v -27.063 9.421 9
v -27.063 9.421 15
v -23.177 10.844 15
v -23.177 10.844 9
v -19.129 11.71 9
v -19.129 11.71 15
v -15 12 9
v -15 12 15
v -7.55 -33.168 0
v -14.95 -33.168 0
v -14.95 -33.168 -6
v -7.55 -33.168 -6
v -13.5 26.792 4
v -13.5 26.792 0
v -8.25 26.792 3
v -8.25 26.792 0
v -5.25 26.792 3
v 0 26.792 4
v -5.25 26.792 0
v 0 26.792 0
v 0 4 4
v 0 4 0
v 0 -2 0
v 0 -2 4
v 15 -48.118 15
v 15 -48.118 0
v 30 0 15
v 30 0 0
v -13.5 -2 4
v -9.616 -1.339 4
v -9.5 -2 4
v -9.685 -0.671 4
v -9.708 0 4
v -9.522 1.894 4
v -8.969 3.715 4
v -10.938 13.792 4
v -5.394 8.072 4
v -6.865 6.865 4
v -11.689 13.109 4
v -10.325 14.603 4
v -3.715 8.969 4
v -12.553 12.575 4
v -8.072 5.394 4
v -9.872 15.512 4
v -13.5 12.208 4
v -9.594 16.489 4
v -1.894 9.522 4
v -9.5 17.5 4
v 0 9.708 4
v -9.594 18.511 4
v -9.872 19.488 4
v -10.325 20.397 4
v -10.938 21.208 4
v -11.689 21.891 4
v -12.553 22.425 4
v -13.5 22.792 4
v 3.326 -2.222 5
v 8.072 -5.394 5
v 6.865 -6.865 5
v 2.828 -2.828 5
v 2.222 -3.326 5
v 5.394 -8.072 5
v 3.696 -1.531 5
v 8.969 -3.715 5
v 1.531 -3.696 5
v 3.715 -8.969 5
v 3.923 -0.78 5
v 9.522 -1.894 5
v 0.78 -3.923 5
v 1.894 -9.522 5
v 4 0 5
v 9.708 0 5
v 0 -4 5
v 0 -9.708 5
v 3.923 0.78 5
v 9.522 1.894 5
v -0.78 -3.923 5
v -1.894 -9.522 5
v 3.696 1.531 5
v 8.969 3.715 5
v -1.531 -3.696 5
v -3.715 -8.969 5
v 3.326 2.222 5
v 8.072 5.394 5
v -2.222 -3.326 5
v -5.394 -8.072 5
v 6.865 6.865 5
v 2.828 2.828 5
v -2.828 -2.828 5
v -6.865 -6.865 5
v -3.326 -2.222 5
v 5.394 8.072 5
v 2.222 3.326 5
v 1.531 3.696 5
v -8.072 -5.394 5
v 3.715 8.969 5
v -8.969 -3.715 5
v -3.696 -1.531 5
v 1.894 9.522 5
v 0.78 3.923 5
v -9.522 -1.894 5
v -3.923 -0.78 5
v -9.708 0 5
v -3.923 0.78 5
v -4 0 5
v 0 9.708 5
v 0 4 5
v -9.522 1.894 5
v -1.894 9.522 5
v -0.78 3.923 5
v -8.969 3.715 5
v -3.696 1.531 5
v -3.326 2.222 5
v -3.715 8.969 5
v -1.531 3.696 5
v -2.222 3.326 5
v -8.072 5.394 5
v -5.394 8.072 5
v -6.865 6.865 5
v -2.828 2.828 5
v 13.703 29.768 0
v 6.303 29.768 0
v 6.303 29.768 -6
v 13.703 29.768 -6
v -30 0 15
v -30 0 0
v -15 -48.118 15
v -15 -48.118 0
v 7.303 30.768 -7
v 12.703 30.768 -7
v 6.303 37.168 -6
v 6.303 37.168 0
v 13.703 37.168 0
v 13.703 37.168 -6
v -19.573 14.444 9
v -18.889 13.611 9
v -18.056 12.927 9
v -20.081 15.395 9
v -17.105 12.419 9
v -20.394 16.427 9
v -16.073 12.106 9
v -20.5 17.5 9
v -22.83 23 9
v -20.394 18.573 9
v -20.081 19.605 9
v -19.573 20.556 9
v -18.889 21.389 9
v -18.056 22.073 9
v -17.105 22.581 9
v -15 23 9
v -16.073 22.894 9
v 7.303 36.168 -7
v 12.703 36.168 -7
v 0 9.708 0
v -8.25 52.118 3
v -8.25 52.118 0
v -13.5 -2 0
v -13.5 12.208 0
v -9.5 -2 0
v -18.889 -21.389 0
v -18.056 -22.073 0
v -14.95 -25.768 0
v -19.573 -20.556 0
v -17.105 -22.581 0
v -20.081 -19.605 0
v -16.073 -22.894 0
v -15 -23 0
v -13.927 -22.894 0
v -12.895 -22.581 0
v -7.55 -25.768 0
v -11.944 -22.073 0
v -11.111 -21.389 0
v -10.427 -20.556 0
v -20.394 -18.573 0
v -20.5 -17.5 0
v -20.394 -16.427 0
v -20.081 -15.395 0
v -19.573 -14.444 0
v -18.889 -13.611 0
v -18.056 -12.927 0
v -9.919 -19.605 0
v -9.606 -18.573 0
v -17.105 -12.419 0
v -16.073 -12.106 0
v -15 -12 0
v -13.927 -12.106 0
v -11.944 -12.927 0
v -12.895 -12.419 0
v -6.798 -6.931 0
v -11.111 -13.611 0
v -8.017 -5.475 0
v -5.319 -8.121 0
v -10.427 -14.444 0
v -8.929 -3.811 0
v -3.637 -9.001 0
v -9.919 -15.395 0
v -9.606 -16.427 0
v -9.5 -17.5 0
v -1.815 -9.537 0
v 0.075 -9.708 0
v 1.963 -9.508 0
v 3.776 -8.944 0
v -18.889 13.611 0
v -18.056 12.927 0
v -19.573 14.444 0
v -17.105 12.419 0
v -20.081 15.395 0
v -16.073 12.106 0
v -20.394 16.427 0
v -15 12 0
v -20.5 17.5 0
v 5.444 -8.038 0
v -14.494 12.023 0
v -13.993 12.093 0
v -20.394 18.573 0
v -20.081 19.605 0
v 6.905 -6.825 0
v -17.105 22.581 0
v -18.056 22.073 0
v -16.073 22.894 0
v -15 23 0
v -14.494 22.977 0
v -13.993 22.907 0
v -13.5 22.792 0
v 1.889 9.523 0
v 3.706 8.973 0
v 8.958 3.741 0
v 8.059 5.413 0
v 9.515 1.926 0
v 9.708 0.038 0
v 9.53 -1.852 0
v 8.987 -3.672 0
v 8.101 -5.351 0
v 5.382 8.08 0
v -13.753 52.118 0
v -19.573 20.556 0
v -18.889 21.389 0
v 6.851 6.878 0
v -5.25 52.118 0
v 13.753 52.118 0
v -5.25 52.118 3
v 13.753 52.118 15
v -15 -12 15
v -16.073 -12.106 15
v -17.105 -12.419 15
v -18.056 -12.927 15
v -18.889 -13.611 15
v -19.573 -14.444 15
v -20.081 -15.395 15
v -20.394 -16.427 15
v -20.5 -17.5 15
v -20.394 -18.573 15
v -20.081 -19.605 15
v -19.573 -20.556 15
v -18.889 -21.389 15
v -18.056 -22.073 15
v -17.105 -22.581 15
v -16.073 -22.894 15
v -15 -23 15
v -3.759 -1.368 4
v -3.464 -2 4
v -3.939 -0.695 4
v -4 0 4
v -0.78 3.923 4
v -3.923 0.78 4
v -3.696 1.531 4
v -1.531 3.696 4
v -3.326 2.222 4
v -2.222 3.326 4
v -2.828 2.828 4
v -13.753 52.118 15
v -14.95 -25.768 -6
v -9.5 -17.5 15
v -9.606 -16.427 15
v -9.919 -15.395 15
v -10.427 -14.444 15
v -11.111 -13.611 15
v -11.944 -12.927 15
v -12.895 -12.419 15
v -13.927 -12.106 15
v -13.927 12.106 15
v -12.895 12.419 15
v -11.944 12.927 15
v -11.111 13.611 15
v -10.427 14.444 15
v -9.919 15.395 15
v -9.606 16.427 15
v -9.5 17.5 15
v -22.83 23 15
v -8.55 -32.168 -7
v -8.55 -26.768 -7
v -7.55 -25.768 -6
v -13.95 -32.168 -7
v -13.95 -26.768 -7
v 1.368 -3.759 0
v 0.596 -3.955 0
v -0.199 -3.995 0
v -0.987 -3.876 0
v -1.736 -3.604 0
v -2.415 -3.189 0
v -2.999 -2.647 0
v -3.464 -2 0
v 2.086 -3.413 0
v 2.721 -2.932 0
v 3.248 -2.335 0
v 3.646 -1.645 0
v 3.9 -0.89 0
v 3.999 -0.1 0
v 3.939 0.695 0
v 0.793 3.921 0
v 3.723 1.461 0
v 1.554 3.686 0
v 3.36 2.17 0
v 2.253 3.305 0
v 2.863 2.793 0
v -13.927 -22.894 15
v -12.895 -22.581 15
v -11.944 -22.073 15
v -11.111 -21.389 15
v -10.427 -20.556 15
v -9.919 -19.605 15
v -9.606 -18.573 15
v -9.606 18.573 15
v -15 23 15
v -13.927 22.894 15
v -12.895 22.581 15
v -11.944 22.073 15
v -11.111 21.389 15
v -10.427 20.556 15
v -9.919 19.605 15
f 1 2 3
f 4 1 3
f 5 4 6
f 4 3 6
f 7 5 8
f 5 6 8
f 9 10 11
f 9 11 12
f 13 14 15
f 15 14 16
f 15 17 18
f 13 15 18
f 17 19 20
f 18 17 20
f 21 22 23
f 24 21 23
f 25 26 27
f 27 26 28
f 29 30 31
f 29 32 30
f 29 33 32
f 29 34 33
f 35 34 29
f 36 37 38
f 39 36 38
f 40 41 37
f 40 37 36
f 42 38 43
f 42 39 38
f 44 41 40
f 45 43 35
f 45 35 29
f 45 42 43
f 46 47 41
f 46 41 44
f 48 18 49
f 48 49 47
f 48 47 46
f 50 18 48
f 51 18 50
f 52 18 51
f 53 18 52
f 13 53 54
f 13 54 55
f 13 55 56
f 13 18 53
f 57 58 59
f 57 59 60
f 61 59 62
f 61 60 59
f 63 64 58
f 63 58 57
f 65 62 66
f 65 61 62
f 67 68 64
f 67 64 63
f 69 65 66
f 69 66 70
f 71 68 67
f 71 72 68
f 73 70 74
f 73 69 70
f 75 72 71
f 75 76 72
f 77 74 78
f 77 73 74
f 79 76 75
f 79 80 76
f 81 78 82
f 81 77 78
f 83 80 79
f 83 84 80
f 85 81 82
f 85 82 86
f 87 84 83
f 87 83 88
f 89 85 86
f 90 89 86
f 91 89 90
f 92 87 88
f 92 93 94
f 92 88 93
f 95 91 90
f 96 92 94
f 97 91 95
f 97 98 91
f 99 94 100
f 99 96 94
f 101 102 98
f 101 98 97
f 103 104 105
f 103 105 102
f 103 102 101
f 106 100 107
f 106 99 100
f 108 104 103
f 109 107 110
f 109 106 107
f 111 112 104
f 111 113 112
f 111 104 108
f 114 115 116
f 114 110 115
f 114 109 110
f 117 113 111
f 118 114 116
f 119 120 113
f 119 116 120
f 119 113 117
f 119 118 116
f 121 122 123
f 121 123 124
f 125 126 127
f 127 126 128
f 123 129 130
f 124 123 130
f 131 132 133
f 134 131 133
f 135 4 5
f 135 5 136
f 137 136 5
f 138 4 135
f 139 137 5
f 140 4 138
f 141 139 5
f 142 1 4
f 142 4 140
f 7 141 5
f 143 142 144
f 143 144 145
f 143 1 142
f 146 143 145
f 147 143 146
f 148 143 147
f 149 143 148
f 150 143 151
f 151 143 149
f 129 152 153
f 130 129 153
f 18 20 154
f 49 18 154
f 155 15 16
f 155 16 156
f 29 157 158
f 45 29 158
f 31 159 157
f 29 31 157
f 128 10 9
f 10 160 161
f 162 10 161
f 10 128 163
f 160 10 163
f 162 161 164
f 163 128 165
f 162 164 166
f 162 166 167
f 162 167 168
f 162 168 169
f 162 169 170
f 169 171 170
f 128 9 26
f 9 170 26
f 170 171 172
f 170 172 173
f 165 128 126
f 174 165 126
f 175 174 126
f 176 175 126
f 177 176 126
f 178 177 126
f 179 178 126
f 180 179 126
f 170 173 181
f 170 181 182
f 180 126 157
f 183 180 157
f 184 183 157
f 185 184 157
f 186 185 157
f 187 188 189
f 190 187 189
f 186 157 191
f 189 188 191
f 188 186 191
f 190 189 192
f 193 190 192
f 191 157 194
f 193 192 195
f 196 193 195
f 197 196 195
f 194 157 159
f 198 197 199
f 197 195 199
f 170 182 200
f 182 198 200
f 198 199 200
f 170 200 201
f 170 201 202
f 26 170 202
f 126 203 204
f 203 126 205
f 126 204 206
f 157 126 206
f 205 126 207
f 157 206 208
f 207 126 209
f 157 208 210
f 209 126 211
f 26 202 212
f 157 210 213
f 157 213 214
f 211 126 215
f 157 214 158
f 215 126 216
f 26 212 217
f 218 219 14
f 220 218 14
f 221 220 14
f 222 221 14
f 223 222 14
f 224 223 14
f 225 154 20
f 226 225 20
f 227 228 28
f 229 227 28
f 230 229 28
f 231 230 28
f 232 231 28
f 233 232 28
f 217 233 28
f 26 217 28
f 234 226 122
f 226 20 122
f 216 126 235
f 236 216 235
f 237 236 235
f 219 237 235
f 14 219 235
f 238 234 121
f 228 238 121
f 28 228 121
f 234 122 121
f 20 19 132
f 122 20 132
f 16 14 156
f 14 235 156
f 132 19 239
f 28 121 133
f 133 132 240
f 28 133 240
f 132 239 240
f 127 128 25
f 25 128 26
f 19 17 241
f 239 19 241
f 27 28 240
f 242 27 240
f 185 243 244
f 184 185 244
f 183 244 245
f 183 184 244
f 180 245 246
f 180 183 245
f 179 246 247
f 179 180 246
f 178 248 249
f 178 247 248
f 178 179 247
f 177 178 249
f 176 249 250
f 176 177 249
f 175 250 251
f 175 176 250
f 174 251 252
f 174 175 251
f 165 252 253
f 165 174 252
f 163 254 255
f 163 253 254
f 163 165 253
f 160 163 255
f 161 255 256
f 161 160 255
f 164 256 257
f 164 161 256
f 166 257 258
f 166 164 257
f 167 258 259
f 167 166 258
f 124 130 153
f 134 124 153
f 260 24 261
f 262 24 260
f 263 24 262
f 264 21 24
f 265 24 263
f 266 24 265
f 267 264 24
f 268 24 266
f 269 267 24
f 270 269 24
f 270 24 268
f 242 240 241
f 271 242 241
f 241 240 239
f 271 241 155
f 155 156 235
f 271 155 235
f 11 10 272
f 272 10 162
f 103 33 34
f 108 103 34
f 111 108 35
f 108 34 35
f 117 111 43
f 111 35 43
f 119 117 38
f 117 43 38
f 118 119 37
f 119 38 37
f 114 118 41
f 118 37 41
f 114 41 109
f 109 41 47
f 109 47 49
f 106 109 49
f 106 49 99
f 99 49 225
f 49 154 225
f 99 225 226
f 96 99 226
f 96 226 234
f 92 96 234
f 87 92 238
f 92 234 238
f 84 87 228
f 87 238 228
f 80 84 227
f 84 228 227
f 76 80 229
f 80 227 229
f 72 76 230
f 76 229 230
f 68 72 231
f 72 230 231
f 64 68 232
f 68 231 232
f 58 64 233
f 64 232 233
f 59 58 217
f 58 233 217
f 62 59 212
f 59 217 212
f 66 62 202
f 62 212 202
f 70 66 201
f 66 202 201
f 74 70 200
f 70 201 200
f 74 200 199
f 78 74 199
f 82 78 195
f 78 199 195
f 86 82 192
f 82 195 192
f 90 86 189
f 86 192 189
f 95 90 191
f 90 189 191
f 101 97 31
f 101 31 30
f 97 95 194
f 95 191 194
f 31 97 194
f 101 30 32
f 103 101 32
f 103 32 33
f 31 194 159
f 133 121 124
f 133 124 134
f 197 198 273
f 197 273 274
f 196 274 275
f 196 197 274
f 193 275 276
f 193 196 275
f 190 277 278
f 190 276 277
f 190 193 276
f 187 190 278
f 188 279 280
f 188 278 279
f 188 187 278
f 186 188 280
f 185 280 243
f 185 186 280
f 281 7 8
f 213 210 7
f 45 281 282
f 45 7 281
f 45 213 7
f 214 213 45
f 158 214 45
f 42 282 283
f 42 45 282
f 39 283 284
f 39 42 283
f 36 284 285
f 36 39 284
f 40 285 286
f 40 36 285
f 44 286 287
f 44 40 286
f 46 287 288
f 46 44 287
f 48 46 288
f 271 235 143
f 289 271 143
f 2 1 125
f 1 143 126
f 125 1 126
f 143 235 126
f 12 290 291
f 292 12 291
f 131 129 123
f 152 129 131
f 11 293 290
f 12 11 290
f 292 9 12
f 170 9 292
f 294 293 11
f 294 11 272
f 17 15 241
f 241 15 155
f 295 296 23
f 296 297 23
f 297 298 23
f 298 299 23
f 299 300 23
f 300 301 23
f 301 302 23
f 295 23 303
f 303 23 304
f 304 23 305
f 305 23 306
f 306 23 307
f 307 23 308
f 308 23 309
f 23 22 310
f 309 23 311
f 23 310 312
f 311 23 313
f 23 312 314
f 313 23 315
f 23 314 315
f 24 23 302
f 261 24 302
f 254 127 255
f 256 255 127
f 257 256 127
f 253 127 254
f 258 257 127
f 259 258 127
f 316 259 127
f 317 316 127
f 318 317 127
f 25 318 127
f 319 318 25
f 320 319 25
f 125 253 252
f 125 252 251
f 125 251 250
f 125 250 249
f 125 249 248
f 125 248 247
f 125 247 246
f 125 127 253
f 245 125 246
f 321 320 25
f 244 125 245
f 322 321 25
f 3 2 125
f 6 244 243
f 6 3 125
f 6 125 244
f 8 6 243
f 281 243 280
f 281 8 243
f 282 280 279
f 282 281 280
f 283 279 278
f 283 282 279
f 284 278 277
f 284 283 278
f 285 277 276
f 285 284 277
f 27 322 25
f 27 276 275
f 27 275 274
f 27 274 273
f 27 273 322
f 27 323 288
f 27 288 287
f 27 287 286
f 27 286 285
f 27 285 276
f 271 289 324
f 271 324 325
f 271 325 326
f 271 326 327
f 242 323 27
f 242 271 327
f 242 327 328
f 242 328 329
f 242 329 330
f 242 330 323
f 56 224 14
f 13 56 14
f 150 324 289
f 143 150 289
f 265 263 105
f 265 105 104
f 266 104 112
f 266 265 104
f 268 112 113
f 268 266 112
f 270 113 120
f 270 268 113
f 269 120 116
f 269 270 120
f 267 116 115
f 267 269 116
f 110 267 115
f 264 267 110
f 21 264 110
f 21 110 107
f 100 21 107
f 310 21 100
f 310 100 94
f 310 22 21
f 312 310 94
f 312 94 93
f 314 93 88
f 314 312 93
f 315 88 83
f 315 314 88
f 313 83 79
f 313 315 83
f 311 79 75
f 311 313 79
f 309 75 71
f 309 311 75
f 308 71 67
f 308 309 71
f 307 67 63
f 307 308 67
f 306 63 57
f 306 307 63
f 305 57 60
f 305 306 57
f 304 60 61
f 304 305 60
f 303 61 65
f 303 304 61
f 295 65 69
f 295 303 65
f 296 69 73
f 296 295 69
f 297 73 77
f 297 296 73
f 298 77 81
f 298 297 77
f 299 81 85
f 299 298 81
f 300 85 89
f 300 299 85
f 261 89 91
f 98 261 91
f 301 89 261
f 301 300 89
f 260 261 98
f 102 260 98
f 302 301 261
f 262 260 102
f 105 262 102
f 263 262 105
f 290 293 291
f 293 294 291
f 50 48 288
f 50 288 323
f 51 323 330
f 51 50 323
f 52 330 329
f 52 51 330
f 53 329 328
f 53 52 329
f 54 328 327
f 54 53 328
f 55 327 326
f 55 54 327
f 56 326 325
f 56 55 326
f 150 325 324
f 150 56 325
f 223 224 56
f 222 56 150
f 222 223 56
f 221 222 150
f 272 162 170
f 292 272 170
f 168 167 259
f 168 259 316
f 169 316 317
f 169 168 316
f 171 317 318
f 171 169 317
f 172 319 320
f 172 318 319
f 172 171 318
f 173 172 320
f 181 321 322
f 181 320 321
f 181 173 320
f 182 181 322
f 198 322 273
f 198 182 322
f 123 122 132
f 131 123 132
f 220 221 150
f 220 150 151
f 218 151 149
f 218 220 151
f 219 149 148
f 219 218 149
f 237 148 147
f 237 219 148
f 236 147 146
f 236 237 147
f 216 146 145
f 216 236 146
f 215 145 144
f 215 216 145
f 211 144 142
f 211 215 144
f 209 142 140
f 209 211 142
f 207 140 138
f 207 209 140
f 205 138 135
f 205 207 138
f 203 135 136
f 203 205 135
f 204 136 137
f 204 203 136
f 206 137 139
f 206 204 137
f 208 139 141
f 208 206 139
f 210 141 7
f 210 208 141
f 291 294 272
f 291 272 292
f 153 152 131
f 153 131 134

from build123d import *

# Parameters (mm, degrees)
BOSS_EXTRUDE1_DEPTH    = 15
SKETCH1_5_W            = 7.4
SKETCH1_5_H            = 7.4
BOSS_EXTRUDE2_DEPTH    = 7
CHAMFER1_SIZE          = 1
SKETCH2_R              = 9.708243919
SKETCH2_R_2            = 4
INNER_DISK_DEPTH       = 5
HOLE_DEPTH             = 65.033705881
HOLE_DEPTH_BACK        = 65.033705881
CUT_EXTRUDE5_DEPTH     = 6
CUT_EXTRUDE3_DEPTH     = 4
CUT_EXTRUDE4_START     = -8.25
CUT_EXTRUDE4_OUTLINE_W = 25.326781011
CUT_EXTRUDE4_OUTLINE_H = 3
CUT_EXTRUDE4_DEPTH     = 3


# Read off the part's stored shape, not the designer's step: Cut-Extrude4
with BuildPart() as part:
    # Sketch1 → Boss-Extrude1 (new body)
    with BuildSketch(Plane.XY):
        Polygon((30, 0), (13.753072731, 52.118283633), (-13.753072731, 52.118283633), (-30, 0), (-15, -48.118283633), (15, -48.118283633), align=None)
    extrude(amount=BOSS_EXTRUDE1_DEPTH)

    # Sketch1<5> → Boss-Extrude2 (add)
    with BuildSketch(Plane.XY):
        with Locations((10.003072731, 33.468283633)):
            Rectangle(SKETCH1_5_W, SKETCH1_5_H)
        with Locations((-11.25, -29.468283633)):
            Rectangle(SKETCH1_5_W, SKETCH1_5_H)
    extrude(amount=-BOSS_EXTRUDE2_DEPTH)

    # Chamfer1
    chamfer1_edges = [part.edges().sort_by_distance(p)[0] for p in [
        (10.003072731, 37.168283633, -7),
        (6.303072731, 33.468283633, -7),
        (13.703072731, 33.468283633, -7),
        (10.003072731, 29.768283633, -7),
        (-11.25, -33.168283633, -7),
        (-7.55, -29.468283633, -7),
        (-14.95, -29.468283633, -7),
        (-11.25, -25.768283633, -7),
    ]]
    chamfer(chamfer1_edges, length=CHAMFER1_SIZE)

    # Sketch2 → Inner Disk (cut)
    with BuildSketch(Plane(origin=(0, 0, 0), x_dir=(-1, 0, 0), z_dir=(0, 0, -1))):
        Circle(SKETCH2_R)
        Circle(SKETCH2_R_2, mode=Mode.SUBTRACT)
    extrude(amount=-INNER_DISK_DEPTH, mode=Mode.SUBTRACT)

    # Sketch3 → Hole (cut, two sides: drawn at the far end of the back side and taken through both)
    with BuildSketch(Plane.XY.offset(15).offset(-HOLE_DEPTH_BACK)):
        with BuildLine():
            ThreePointArc((-15, 23), (-20.5, 17.5), (-15, 12))
            Line((-15, 12), (-15, 17.5))
            Line((-15, 17.5), (-15, 23))
        make_face()
        with BuildLine():
            Line((-15, 17.5), (-15, 12))
            ThreePointArc((-15, 12), (-11.110912703, 13.610912703), (-9.5, 17.5))
            ThreePointArc((-9.5, 17.5), (-11.110912703, 21.389087297), (-15, 23))
            Line((-15, 23), (-15, 17.5))
        make_face()
        with BuildLine():
            ThreePointArc((-9.5, -17.5), (-11.110912703, -13.610912703), (-15, -12))
            Line((-15, -12), (-15, -17.5))
            Line((-15, -17.5), (-15, -23))
            ThreePointArc((-15, -23), (-11.110912703, -21.389087297), (-9.5, -17.5))
        make_face()
        with BuildLine():
            Line((-15, -17.5), (-15, -12))
            ThreePointArc((-15, -12), (-20.5, -17.5), (-15, -23))
            Line((-15, -23), (-15, -17.5))
        make_face()
    extrude(amount=HOLE_DEPTH + HOLE_DEPTH_BACK, mode=Mode.SUBTRACT)

    # Sketch3<3> → Cut-Extrude5 (cut)
    with BuildSketch(Plane.XY.offset(15)):
        with BuildLine():
            ThreePointArc((-27.063244683, 9.420775021), (-21.167946858, 11.347988345), (-15, 12))
            ThreePointArc((-15, 12), (-20.5, 17.5), (-15, 23))
            Line((-15, 23), (-22.830168203, 23))
            Line((-22.830168203, 23), (-27.063244683, 9.420775021))
        make_face()
    extrude(amount=-CUT_EXTRUDE5_DEPTH, mode=Mode.SUBTRACT)

    # Sketch4 → Cut-Extrude3 (cut)
    with BuildSketch(Plane(origin=(0, 0, 0), x_dir=(-1, 0, 0), z_dir=(0, 0, -1))):
        with BuildLine():
            Line((0, 9.708243919), (0, -2))
            Line((0, -2), (9.5, -2))
            ThreePointArc((9.5, -2), (9.656042596, -1.005406078), (9.708243919, 0))
            ThreePointArc((9.708243919, 0), (6.864765109, 6.864765109), (0, 9.708243919))
        make_face()
        with BuildLine():
            ThreePointArc((9.708243919, 0), (9.656042596, -1.005406078), (9.5, -2))
            Line((9.5, -2), (13.5, -2))
            Line((13.5, -2), (13.5, 12.208497378))
            ThreePointArc((13.5, 12.208497378), (9.5, 17.5), (13.5, 22.791502622))
            Line((13.5, 22.791502622), (13.5, 26.791502622))
            Line((13.5, 26.791502622), (8.25, 26.791502622))
            Line((8.25, 26.791502622), (5.25, 26.791502622))
            Line((5.25, 26.791502622), (0, 26.791502622))
            Line((0, 26.791502622), (0, 17.5))
            Line((0, 17.5), (0, 9.708243919))
            ThreePointArc((0, 9.708243919), (6.864765109, 6.864765109), (9.708243919, 0))
        make_face()
    extrude(amount=-CUT_EXTRUDE3_DEPTH, mode=Mode.SUBTRACT)

    # Cut-Extrude4 outline → Cut-Extrude4 (cut)
    with BuildSketch(Plane.YZ.offset(CUT_EXTRUDE4_START)):
        with Locations((39.454893128, 1.5)):
            Rectangle(CUT_EXTRUDE4_OUTLINE_W, CUT_EXTRUDE4_OUTLINE_H)
    extrude(amount=CUT_EXTRUDE4_DEPTH, mode=Mode.SUBTRACT)


solid = part.part
